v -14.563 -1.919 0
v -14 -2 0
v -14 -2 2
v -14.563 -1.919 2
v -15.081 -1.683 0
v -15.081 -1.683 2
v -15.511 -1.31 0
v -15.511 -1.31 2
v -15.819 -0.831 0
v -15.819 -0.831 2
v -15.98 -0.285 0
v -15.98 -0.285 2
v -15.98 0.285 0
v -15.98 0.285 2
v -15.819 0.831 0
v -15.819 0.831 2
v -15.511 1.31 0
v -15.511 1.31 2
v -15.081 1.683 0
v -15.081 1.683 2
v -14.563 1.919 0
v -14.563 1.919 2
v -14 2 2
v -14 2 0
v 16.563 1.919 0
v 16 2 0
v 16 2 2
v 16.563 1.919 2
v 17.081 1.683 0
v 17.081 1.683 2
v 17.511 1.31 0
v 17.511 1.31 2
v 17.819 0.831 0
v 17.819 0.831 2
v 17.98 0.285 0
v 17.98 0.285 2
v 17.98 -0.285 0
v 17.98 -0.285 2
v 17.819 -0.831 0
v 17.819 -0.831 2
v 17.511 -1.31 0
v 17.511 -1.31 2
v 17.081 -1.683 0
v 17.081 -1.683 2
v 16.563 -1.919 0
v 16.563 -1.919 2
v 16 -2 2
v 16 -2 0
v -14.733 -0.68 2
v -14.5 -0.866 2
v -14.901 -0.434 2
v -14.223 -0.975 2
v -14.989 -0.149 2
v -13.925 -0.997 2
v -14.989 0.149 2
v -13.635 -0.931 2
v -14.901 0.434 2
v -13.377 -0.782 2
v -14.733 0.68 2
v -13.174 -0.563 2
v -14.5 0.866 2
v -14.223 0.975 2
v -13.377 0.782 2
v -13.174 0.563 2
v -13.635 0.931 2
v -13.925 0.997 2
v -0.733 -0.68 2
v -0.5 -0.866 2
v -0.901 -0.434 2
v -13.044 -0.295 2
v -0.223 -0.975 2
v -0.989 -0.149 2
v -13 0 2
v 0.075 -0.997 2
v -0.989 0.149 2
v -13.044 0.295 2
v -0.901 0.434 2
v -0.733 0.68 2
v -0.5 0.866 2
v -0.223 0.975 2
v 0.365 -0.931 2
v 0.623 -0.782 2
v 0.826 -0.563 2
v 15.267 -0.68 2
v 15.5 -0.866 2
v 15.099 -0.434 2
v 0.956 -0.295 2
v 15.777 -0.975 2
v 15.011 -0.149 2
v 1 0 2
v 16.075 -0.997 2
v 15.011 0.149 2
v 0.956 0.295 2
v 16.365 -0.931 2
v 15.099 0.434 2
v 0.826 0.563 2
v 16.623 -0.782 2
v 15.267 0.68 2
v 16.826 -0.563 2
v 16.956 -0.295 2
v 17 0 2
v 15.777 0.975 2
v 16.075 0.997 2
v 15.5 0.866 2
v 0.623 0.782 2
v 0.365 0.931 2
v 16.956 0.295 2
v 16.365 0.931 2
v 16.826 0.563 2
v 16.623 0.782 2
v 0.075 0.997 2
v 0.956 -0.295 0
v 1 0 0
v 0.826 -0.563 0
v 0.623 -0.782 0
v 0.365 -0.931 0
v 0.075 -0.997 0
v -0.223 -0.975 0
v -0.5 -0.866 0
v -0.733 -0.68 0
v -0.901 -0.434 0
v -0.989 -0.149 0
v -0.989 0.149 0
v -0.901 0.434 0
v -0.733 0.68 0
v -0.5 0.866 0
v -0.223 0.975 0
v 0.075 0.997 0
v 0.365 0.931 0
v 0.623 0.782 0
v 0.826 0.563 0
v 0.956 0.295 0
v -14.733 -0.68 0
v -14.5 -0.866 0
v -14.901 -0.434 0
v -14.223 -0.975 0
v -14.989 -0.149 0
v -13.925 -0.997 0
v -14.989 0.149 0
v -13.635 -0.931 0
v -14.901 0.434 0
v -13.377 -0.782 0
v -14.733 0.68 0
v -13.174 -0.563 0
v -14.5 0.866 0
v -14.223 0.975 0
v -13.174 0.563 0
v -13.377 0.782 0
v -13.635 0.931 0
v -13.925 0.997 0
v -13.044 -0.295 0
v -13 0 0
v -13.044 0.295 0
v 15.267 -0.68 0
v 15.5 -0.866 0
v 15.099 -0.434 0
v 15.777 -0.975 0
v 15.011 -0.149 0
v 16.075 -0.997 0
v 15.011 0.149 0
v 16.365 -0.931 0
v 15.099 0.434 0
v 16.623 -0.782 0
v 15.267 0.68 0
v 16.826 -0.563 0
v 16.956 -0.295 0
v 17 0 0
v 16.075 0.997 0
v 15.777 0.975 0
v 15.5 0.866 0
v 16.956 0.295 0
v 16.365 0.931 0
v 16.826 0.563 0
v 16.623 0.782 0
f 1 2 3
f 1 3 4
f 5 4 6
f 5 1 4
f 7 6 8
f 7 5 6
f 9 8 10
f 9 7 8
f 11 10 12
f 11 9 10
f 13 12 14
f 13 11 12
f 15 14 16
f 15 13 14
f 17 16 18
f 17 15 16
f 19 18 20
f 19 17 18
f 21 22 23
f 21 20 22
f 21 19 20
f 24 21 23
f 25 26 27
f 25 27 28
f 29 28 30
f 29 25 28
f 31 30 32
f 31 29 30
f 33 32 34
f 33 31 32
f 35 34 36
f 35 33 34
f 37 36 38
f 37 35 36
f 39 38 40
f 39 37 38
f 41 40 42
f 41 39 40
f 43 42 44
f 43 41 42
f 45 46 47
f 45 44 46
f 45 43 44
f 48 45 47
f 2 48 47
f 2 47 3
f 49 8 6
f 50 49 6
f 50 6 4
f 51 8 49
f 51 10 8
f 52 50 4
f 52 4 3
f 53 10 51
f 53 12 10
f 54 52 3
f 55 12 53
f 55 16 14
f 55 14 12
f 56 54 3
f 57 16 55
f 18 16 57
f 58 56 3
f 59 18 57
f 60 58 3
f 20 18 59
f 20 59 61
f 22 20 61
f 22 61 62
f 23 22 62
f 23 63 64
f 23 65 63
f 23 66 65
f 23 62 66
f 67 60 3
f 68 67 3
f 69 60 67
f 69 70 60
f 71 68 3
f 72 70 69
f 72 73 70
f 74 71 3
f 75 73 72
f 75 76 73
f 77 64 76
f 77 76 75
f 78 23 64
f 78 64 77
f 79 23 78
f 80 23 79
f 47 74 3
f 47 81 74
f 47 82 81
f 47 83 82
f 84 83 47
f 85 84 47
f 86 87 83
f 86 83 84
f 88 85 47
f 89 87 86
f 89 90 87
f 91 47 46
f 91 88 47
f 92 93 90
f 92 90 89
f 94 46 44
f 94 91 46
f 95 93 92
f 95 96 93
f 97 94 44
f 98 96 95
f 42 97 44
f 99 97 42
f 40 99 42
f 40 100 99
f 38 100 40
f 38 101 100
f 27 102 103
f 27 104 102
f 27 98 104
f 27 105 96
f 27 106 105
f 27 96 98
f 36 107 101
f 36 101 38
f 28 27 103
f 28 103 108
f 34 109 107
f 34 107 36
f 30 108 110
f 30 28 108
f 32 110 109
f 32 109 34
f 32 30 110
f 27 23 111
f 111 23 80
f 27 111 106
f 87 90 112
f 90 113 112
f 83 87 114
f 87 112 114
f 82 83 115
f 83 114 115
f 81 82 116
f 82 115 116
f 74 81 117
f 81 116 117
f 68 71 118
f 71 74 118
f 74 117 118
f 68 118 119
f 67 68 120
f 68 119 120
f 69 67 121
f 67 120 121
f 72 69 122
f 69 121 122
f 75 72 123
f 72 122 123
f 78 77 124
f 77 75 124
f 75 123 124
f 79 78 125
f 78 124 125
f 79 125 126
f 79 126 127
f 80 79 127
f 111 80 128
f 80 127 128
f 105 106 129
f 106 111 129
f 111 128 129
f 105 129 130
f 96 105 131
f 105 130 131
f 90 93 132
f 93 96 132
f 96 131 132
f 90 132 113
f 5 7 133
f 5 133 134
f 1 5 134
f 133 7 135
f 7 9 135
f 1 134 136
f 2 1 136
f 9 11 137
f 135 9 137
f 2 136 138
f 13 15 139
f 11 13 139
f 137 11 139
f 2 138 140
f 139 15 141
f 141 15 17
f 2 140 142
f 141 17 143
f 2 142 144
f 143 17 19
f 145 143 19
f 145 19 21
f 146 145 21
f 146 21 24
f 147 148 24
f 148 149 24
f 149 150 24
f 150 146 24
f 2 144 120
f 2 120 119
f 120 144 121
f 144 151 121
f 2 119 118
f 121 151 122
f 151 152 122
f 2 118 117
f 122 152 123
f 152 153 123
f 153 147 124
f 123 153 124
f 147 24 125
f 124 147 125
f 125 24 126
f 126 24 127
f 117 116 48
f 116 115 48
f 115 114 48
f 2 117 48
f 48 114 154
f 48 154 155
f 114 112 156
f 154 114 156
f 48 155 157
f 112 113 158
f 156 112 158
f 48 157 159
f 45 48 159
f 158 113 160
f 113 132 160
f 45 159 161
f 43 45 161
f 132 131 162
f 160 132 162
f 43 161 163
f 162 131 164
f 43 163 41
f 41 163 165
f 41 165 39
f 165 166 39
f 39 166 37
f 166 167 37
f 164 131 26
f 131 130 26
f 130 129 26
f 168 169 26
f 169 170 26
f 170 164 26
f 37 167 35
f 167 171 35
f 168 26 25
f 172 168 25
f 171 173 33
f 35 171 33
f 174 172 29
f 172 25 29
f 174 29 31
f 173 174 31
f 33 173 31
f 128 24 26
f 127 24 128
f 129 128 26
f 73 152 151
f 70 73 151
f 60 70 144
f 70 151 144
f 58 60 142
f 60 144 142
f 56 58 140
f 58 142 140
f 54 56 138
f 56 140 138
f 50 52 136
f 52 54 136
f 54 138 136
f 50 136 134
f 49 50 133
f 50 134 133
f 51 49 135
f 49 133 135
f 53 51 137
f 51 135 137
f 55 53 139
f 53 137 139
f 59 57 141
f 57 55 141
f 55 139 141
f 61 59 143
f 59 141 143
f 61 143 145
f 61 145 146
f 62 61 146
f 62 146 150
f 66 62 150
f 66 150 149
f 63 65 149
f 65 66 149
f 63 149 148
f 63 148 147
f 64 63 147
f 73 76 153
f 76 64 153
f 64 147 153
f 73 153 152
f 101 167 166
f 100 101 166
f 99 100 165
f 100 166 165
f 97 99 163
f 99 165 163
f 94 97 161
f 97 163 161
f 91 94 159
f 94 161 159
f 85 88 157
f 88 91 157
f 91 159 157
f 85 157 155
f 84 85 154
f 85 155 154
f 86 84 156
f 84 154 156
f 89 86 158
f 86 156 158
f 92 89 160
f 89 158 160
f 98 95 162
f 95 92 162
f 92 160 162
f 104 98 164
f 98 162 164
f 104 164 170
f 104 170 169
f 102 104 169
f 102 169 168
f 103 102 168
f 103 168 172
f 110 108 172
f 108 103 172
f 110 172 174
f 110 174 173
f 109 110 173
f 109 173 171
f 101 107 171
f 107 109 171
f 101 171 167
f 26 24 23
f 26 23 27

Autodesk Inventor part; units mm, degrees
ref_plane "YZ Plane" through (0, 0, 0) normal (1, 0, 0) x (0, 1, 0)
ref_plane "XZ Plane" through (0, 0, 0) normal (0, 1, 0) x (-1, 0, 0)
ref_plane "XY Plane" through (0, 0, 0) normal (0, 0, 1) x (1, 0, 0)
sketch "Sketch1" plane through (0, 0, 0) normal (0, 0, 1) x (1, 0, 0)
  circle A0 centre (0, 0) radius 1
  circle A1 centre (-14, 0) radius 1
  line L0 (-14, 2) -> (16, 2)
  line L1 (16, -2) -> (-14, -2)
  arc A2 (-14, 2) -> (-14, -2) centre (-14, 0) ccw
  circle A3 centre (16, 0) radius 1
  arc A4 (16, -2) -> (16, 2) centre (16, 0) ccw
  dimension "d0" = 2
  dimension "d1" = 14
  dimension "d5" = 16
  dimension "d6" = 2
extrude "Extrusion1" add sketch "Sketch1" along normal blind 2
properties part number "panto_linkageC"
